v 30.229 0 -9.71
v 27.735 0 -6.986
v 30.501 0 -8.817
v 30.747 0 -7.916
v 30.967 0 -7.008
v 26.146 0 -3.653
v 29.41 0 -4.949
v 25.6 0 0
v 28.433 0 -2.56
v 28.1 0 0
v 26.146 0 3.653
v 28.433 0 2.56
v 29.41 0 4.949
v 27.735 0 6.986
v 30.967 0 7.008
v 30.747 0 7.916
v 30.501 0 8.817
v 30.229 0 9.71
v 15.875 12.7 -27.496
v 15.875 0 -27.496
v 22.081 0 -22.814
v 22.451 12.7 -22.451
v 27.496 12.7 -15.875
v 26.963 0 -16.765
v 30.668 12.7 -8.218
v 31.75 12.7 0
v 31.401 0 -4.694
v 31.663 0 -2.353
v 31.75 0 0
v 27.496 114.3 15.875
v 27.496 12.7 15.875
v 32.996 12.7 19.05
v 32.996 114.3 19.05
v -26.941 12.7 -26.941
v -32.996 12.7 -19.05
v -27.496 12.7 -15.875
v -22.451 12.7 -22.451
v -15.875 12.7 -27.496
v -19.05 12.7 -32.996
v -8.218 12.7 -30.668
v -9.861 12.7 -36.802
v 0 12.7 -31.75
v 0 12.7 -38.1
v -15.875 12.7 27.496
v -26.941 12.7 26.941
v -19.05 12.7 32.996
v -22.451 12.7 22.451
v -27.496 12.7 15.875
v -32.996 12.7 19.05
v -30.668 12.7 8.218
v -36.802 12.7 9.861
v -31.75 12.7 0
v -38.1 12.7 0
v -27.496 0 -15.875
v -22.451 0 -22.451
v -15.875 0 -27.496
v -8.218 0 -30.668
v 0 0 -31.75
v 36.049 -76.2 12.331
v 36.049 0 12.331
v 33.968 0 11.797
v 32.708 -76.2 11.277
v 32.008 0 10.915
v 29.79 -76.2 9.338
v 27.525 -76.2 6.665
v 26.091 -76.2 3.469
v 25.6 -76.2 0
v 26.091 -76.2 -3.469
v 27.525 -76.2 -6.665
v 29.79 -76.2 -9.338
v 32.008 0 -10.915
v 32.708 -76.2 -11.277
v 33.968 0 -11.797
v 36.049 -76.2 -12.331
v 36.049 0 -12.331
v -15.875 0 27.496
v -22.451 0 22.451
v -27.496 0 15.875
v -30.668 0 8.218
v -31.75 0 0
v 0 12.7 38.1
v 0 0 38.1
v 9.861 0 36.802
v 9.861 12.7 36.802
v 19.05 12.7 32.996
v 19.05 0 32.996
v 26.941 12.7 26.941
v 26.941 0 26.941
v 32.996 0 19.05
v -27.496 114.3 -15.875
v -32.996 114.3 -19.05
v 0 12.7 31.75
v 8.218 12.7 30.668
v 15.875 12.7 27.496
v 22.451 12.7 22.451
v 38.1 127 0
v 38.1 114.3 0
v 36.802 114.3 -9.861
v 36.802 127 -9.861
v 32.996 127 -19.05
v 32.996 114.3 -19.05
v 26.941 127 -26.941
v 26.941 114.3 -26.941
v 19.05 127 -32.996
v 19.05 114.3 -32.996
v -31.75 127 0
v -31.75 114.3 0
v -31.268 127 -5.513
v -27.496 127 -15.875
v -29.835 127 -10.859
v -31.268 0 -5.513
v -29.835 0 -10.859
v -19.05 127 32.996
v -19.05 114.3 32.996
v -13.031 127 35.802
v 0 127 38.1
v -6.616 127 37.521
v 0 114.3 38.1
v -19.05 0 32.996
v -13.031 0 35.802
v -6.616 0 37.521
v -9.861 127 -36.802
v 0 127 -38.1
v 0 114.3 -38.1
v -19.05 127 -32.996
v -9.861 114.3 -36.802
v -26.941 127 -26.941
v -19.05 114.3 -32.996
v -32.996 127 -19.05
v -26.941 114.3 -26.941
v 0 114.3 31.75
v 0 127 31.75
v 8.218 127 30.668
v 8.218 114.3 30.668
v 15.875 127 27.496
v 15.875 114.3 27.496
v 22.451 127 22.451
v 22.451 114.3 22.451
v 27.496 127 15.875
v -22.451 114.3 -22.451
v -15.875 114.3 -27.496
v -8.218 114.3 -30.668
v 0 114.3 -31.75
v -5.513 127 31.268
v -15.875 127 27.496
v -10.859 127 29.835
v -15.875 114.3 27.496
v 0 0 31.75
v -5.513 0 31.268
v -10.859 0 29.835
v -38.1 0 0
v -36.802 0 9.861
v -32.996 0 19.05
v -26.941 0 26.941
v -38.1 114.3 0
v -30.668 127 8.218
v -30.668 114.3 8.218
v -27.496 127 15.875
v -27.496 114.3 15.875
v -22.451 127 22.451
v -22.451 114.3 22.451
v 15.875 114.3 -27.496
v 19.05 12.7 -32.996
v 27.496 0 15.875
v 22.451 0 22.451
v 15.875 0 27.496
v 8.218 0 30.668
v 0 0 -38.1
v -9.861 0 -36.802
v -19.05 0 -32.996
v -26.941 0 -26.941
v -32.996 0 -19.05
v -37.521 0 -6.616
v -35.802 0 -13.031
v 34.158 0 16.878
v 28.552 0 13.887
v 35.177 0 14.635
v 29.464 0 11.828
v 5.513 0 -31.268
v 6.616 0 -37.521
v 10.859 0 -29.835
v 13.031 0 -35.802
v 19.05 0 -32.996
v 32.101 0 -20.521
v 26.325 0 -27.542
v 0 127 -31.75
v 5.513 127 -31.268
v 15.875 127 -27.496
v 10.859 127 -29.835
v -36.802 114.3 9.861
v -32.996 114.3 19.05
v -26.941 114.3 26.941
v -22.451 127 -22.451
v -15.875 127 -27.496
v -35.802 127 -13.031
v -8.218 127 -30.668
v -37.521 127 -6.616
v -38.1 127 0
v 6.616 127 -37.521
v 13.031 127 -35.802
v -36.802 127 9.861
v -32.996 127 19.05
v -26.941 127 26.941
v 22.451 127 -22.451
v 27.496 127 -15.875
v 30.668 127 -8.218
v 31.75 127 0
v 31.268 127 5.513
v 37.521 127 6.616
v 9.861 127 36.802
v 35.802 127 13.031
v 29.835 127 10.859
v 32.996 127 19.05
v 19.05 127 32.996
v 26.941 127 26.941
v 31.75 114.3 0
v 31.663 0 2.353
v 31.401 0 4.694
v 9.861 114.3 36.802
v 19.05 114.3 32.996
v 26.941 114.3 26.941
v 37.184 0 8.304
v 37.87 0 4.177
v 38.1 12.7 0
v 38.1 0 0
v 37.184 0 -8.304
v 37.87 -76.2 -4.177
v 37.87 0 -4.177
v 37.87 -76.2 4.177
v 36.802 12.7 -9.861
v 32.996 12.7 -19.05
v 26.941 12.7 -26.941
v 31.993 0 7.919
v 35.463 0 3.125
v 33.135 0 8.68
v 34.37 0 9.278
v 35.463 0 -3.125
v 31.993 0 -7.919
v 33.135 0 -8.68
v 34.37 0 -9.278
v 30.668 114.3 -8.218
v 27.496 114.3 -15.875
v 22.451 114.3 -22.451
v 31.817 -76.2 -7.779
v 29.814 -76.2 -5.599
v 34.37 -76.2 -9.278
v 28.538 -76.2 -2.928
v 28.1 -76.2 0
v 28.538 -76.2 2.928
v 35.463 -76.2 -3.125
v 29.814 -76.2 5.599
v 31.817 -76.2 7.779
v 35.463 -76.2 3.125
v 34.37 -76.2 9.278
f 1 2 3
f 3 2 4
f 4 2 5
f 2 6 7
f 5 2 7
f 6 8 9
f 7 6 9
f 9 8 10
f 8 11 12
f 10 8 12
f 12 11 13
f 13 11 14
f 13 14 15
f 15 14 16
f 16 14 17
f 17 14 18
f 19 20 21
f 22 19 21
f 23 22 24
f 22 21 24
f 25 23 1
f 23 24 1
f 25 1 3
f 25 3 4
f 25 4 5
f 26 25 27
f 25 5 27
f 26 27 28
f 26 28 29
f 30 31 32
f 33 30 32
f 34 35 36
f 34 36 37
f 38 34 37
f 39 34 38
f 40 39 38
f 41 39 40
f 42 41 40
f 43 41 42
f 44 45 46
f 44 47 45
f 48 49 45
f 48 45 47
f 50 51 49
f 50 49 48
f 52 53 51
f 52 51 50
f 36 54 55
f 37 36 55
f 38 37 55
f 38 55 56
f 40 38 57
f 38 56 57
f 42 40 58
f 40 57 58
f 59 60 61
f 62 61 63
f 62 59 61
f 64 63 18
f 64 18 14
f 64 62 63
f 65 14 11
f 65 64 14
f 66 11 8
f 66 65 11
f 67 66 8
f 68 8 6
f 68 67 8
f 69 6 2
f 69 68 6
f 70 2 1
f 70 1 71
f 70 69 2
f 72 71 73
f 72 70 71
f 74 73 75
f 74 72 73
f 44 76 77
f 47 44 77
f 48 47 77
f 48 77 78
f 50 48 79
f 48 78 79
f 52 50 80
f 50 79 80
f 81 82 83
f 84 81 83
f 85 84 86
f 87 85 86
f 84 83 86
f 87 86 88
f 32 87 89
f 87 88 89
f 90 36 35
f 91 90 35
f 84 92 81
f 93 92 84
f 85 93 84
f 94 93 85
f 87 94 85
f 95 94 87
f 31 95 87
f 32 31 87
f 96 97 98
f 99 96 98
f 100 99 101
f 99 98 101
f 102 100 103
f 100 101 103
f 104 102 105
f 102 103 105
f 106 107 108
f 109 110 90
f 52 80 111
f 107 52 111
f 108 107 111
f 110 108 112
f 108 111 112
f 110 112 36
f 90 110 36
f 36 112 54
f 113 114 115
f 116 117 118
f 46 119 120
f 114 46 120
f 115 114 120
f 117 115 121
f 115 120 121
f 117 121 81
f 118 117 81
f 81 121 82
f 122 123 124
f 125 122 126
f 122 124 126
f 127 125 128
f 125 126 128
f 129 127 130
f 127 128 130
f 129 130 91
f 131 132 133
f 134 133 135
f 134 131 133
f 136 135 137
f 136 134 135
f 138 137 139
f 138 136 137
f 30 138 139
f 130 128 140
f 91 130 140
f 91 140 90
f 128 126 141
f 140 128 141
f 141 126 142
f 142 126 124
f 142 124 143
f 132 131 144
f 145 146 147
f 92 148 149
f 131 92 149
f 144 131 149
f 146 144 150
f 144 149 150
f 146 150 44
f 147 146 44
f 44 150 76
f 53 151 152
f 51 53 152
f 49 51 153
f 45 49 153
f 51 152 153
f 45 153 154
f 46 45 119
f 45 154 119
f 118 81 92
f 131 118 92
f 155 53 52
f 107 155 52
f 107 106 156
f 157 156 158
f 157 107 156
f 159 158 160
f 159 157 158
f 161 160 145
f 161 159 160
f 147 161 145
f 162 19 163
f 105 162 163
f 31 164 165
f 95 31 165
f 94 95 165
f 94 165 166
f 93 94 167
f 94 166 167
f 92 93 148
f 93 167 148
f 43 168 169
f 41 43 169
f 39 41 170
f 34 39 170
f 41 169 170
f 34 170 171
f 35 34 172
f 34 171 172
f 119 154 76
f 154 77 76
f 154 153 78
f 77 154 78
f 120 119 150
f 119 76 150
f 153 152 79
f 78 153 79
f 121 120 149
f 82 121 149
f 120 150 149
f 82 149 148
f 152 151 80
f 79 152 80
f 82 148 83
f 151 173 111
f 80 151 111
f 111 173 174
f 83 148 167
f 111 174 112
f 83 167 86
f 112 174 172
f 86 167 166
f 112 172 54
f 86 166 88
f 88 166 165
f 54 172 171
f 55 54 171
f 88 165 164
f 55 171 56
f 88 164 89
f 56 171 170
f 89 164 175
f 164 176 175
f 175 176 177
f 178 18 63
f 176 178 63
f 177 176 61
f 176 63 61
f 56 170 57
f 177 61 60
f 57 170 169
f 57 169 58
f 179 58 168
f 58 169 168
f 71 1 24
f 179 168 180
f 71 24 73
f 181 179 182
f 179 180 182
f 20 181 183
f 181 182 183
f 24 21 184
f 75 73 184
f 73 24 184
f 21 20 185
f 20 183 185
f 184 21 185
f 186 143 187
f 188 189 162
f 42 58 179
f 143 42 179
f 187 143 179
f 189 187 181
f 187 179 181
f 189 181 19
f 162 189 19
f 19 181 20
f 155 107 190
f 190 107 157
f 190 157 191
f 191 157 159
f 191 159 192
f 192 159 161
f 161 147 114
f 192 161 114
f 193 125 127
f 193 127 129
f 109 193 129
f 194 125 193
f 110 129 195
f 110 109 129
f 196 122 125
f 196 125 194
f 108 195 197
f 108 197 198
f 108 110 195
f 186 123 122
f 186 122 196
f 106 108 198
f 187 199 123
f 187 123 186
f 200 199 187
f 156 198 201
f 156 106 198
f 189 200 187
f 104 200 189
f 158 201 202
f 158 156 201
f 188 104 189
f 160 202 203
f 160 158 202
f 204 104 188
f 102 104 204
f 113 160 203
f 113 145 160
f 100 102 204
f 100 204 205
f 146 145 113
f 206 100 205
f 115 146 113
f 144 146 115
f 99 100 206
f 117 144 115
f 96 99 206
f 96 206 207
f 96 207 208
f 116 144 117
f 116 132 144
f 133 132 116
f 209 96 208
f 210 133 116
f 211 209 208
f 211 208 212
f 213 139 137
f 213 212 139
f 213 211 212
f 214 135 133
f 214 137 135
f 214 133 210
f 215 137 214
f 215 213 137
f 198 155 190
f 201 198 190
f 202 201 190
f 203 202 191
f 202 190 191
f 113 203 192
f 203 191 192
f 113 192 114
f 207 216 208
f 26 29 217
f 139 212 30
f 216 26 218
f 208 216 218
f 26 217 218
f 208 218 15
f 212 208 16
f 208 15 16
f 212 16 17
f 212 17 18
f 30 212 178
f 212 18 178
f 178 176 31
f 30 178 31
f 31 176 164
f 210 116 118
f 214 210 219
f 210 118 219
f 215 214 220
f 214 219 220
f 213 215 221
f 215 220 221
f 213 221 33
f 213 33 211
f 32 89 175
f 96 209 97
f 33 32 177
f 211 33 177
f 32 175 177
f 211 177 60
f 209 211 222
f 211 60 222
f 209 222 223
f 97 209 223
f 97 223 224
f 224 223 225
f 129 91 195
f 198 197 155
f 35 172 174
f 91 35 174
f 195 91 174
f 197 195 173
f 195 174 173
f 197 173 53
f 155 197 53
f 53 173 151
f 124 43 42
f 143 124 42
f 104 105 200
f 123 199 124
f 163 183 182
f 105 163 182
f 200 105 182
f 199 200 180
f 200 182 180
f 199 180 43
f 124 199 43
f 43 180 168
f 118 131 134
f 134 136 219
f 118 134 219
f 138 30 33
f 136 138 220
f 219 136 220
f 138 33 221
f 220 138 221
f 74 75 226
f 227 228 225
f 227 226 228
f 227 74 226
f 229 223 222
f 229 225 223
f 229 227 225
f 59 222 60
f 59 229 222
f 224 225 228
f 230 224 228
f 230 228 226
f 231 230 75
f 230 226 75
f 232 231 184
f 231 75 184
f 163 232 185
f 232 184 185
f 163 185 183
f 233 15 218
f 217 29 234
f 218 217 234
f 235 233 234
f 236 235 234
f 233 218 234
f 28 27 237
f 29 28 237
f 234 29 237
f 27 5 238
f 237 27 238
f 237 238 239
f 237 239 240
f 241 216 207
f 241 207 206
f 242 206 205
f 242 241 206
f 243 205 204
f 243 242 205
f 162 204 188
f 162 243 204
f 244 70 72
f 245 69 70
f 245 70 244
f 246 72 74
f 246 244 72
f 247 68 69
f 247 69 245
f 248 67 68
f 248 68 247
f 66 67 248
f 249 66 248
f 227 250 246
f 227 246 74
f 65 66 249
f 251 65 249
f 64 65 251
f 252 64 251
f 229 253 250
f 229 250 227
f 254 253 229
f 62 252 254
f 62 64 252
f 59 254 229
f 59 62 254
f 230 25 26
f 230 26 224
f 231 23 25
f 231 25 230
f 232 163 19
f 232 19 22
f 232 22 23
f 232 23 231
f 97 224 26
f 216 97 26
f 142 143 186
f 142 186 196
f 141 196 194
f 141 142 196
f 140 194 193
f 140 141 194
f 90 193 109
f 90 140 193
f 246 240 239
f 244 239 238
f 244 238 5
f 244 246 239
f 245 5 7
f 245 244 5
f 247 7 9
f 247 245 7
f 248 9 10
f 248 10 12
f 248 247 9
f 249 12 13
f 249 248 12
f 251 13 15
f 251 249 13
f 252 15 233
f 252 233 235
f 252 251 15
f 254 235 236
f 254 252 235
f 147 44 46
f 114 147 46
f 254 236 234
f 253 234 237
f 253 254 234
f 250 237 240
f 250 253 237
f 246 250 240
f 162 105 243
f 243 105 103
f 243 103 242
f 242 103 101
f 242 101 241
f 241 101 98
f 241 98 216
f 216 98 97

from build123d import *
from build123d.topology import SkipClean

# Parameters (mm, degrees)
SKETCH1_R           = 38.1
SKETCH1_R_2         = 31.75
BOSS_EXTRUDE1_DEPTH = 12.7
BOSS_EXTRUDE2_DEPTH = 127
BOSS_EXTRUDE3_START = -12.7
SKETCH2_R           = 38.1
SKETCH2_R_2         = 31.75
BOSS_EXTRUDE3_DEPTH = 12.7
BOSS_EXTRUDE4_START = 76.2
BOSS_EXTRUDE4_DEPTH = 76.2


with BuildPart() as part:
    # Sketch1 → Boss-Extrude1 (new body)
    with BuildSketch(Plane(origin=(0, 0, 0), x_dir=(1, 0, 0), z_dir=(0, 1, 0))):
        Circle(SKETCH1_R)
        Circle(SKETCH1_R_2, mode=Mode.SUBTRACT)
    extrude(amount=BOSS_EXTRUDE1_DEPTH)

    # Sketch1<3> → Boss-Extrude2 (add)
    with SkipClean():  # the faces are left unmerged after this step: merging them gives an invalid solid
        with BuildSketch(Plane(origin=(0, 0, 0), x_dir=(1, 0, 0), z_dir=(0, 1, 0))):
            with BuildLine():
                ThreePointArc((-19.05, -32.995567884), (-9.861005618, -36.801773982), (0, -38.1))
                Line((0, -38.1), (0, -31.75))
                ThreePointArc((0, -31.75), (-8.217504682, -30.668144985), (-15.875, -27.49630657))
                Line((-15.875, -27.49630657), (-19.05, -32.995567884))
            make_face()
            with BuildLine():
                Line((27.49630657, -15.875), (32.995567884, -19.05))
                ThreePointArc((32.995567884, -19.05), (36.801773982, -9.861005618), (38.1, 0))
                Line((38.1, 0), (31.75, 0))
                ThreePointArc((31.75, 0), (30.668144985, -8.217504682), (27.49630657, -15.875))
            make_face()
            with BuildLine():
                ThreePointArc((-32.995567884, 19.05), (-36.801773982, 9.861005618), (-38.1, 0))
                Line((-38.1, 0), (-31.75, 0))
                ThreePointArc((-31.75, 0), (-30.668144985, 8.217504682), (-27.49630657, 15.875))
                Line((-27.49630657, 15.875), (-32.995567884, 19.05))
            make_face()
            with BuildLine():
                Line((15.875, 27.49630657), (19.05, 32.995567884))
                ThreePointArc((19.05, 32.995567884), (9.861005618, 36.801773982), (0, 38.1))
                Line((0, 38.1), (0, 31.75))
                ThreePointArc((0, 31.75), (8.217504682, 30.668144985), (15.875, 27.49630657))
            make_face()
        extrude(amount=BOSS_EXTRUDE2_DEPTH)

    # Sketch2 → Boss-Extrude3 (add)
    with SkipClean():  # the faces are left unmerged after this step: merging them gives an invalid solid
        with BuildSketch(Plane(origin=(0, 127, 0), x_dir=(1, 0, 0), z_dir=(0, 1, 0)).offset(BOSS_EXTRUDE3_START)):
            Circle(SKETCH2_R)
            Circle(SKETCH2_R_2, mode=Mode.SUBTRACT)
        extrude(amount=BOSS_EXTRUDE3_DEPTH)

    # Sketch3 → Boss-Extrude4 (add)
    with SkipClean():  # the faces are left unmerged after this step: merging them gives an invalid solid
        with BuildSketch(Plane.XZ.offset(BOSS_EXTRUDE4_START)):
            with BuildLine():
                ThreePointArc((36.049475066, -12.330666953), (38.1, 0), (36.049475066, 12.330666953))
                ThreePointArc((36.049475066, 12.330666952), (25.6, 0), (36.049475066, -12.330666952))
            make_face()
            with BuildLine():
                ThreePointArc((34.369685039, 9.2781868), (35.6, 0), (34.369685039, -9.2781868))
                ThreePointArc((34.369685039, -9.2781868), (28.1, 0), (34.369685039, 9.2781868))
            make_face(mode=Mode.SUBTRACT)
        extrude(amount=-BOSS_EXTRUDE4_DEPTH)


solid = part.part
